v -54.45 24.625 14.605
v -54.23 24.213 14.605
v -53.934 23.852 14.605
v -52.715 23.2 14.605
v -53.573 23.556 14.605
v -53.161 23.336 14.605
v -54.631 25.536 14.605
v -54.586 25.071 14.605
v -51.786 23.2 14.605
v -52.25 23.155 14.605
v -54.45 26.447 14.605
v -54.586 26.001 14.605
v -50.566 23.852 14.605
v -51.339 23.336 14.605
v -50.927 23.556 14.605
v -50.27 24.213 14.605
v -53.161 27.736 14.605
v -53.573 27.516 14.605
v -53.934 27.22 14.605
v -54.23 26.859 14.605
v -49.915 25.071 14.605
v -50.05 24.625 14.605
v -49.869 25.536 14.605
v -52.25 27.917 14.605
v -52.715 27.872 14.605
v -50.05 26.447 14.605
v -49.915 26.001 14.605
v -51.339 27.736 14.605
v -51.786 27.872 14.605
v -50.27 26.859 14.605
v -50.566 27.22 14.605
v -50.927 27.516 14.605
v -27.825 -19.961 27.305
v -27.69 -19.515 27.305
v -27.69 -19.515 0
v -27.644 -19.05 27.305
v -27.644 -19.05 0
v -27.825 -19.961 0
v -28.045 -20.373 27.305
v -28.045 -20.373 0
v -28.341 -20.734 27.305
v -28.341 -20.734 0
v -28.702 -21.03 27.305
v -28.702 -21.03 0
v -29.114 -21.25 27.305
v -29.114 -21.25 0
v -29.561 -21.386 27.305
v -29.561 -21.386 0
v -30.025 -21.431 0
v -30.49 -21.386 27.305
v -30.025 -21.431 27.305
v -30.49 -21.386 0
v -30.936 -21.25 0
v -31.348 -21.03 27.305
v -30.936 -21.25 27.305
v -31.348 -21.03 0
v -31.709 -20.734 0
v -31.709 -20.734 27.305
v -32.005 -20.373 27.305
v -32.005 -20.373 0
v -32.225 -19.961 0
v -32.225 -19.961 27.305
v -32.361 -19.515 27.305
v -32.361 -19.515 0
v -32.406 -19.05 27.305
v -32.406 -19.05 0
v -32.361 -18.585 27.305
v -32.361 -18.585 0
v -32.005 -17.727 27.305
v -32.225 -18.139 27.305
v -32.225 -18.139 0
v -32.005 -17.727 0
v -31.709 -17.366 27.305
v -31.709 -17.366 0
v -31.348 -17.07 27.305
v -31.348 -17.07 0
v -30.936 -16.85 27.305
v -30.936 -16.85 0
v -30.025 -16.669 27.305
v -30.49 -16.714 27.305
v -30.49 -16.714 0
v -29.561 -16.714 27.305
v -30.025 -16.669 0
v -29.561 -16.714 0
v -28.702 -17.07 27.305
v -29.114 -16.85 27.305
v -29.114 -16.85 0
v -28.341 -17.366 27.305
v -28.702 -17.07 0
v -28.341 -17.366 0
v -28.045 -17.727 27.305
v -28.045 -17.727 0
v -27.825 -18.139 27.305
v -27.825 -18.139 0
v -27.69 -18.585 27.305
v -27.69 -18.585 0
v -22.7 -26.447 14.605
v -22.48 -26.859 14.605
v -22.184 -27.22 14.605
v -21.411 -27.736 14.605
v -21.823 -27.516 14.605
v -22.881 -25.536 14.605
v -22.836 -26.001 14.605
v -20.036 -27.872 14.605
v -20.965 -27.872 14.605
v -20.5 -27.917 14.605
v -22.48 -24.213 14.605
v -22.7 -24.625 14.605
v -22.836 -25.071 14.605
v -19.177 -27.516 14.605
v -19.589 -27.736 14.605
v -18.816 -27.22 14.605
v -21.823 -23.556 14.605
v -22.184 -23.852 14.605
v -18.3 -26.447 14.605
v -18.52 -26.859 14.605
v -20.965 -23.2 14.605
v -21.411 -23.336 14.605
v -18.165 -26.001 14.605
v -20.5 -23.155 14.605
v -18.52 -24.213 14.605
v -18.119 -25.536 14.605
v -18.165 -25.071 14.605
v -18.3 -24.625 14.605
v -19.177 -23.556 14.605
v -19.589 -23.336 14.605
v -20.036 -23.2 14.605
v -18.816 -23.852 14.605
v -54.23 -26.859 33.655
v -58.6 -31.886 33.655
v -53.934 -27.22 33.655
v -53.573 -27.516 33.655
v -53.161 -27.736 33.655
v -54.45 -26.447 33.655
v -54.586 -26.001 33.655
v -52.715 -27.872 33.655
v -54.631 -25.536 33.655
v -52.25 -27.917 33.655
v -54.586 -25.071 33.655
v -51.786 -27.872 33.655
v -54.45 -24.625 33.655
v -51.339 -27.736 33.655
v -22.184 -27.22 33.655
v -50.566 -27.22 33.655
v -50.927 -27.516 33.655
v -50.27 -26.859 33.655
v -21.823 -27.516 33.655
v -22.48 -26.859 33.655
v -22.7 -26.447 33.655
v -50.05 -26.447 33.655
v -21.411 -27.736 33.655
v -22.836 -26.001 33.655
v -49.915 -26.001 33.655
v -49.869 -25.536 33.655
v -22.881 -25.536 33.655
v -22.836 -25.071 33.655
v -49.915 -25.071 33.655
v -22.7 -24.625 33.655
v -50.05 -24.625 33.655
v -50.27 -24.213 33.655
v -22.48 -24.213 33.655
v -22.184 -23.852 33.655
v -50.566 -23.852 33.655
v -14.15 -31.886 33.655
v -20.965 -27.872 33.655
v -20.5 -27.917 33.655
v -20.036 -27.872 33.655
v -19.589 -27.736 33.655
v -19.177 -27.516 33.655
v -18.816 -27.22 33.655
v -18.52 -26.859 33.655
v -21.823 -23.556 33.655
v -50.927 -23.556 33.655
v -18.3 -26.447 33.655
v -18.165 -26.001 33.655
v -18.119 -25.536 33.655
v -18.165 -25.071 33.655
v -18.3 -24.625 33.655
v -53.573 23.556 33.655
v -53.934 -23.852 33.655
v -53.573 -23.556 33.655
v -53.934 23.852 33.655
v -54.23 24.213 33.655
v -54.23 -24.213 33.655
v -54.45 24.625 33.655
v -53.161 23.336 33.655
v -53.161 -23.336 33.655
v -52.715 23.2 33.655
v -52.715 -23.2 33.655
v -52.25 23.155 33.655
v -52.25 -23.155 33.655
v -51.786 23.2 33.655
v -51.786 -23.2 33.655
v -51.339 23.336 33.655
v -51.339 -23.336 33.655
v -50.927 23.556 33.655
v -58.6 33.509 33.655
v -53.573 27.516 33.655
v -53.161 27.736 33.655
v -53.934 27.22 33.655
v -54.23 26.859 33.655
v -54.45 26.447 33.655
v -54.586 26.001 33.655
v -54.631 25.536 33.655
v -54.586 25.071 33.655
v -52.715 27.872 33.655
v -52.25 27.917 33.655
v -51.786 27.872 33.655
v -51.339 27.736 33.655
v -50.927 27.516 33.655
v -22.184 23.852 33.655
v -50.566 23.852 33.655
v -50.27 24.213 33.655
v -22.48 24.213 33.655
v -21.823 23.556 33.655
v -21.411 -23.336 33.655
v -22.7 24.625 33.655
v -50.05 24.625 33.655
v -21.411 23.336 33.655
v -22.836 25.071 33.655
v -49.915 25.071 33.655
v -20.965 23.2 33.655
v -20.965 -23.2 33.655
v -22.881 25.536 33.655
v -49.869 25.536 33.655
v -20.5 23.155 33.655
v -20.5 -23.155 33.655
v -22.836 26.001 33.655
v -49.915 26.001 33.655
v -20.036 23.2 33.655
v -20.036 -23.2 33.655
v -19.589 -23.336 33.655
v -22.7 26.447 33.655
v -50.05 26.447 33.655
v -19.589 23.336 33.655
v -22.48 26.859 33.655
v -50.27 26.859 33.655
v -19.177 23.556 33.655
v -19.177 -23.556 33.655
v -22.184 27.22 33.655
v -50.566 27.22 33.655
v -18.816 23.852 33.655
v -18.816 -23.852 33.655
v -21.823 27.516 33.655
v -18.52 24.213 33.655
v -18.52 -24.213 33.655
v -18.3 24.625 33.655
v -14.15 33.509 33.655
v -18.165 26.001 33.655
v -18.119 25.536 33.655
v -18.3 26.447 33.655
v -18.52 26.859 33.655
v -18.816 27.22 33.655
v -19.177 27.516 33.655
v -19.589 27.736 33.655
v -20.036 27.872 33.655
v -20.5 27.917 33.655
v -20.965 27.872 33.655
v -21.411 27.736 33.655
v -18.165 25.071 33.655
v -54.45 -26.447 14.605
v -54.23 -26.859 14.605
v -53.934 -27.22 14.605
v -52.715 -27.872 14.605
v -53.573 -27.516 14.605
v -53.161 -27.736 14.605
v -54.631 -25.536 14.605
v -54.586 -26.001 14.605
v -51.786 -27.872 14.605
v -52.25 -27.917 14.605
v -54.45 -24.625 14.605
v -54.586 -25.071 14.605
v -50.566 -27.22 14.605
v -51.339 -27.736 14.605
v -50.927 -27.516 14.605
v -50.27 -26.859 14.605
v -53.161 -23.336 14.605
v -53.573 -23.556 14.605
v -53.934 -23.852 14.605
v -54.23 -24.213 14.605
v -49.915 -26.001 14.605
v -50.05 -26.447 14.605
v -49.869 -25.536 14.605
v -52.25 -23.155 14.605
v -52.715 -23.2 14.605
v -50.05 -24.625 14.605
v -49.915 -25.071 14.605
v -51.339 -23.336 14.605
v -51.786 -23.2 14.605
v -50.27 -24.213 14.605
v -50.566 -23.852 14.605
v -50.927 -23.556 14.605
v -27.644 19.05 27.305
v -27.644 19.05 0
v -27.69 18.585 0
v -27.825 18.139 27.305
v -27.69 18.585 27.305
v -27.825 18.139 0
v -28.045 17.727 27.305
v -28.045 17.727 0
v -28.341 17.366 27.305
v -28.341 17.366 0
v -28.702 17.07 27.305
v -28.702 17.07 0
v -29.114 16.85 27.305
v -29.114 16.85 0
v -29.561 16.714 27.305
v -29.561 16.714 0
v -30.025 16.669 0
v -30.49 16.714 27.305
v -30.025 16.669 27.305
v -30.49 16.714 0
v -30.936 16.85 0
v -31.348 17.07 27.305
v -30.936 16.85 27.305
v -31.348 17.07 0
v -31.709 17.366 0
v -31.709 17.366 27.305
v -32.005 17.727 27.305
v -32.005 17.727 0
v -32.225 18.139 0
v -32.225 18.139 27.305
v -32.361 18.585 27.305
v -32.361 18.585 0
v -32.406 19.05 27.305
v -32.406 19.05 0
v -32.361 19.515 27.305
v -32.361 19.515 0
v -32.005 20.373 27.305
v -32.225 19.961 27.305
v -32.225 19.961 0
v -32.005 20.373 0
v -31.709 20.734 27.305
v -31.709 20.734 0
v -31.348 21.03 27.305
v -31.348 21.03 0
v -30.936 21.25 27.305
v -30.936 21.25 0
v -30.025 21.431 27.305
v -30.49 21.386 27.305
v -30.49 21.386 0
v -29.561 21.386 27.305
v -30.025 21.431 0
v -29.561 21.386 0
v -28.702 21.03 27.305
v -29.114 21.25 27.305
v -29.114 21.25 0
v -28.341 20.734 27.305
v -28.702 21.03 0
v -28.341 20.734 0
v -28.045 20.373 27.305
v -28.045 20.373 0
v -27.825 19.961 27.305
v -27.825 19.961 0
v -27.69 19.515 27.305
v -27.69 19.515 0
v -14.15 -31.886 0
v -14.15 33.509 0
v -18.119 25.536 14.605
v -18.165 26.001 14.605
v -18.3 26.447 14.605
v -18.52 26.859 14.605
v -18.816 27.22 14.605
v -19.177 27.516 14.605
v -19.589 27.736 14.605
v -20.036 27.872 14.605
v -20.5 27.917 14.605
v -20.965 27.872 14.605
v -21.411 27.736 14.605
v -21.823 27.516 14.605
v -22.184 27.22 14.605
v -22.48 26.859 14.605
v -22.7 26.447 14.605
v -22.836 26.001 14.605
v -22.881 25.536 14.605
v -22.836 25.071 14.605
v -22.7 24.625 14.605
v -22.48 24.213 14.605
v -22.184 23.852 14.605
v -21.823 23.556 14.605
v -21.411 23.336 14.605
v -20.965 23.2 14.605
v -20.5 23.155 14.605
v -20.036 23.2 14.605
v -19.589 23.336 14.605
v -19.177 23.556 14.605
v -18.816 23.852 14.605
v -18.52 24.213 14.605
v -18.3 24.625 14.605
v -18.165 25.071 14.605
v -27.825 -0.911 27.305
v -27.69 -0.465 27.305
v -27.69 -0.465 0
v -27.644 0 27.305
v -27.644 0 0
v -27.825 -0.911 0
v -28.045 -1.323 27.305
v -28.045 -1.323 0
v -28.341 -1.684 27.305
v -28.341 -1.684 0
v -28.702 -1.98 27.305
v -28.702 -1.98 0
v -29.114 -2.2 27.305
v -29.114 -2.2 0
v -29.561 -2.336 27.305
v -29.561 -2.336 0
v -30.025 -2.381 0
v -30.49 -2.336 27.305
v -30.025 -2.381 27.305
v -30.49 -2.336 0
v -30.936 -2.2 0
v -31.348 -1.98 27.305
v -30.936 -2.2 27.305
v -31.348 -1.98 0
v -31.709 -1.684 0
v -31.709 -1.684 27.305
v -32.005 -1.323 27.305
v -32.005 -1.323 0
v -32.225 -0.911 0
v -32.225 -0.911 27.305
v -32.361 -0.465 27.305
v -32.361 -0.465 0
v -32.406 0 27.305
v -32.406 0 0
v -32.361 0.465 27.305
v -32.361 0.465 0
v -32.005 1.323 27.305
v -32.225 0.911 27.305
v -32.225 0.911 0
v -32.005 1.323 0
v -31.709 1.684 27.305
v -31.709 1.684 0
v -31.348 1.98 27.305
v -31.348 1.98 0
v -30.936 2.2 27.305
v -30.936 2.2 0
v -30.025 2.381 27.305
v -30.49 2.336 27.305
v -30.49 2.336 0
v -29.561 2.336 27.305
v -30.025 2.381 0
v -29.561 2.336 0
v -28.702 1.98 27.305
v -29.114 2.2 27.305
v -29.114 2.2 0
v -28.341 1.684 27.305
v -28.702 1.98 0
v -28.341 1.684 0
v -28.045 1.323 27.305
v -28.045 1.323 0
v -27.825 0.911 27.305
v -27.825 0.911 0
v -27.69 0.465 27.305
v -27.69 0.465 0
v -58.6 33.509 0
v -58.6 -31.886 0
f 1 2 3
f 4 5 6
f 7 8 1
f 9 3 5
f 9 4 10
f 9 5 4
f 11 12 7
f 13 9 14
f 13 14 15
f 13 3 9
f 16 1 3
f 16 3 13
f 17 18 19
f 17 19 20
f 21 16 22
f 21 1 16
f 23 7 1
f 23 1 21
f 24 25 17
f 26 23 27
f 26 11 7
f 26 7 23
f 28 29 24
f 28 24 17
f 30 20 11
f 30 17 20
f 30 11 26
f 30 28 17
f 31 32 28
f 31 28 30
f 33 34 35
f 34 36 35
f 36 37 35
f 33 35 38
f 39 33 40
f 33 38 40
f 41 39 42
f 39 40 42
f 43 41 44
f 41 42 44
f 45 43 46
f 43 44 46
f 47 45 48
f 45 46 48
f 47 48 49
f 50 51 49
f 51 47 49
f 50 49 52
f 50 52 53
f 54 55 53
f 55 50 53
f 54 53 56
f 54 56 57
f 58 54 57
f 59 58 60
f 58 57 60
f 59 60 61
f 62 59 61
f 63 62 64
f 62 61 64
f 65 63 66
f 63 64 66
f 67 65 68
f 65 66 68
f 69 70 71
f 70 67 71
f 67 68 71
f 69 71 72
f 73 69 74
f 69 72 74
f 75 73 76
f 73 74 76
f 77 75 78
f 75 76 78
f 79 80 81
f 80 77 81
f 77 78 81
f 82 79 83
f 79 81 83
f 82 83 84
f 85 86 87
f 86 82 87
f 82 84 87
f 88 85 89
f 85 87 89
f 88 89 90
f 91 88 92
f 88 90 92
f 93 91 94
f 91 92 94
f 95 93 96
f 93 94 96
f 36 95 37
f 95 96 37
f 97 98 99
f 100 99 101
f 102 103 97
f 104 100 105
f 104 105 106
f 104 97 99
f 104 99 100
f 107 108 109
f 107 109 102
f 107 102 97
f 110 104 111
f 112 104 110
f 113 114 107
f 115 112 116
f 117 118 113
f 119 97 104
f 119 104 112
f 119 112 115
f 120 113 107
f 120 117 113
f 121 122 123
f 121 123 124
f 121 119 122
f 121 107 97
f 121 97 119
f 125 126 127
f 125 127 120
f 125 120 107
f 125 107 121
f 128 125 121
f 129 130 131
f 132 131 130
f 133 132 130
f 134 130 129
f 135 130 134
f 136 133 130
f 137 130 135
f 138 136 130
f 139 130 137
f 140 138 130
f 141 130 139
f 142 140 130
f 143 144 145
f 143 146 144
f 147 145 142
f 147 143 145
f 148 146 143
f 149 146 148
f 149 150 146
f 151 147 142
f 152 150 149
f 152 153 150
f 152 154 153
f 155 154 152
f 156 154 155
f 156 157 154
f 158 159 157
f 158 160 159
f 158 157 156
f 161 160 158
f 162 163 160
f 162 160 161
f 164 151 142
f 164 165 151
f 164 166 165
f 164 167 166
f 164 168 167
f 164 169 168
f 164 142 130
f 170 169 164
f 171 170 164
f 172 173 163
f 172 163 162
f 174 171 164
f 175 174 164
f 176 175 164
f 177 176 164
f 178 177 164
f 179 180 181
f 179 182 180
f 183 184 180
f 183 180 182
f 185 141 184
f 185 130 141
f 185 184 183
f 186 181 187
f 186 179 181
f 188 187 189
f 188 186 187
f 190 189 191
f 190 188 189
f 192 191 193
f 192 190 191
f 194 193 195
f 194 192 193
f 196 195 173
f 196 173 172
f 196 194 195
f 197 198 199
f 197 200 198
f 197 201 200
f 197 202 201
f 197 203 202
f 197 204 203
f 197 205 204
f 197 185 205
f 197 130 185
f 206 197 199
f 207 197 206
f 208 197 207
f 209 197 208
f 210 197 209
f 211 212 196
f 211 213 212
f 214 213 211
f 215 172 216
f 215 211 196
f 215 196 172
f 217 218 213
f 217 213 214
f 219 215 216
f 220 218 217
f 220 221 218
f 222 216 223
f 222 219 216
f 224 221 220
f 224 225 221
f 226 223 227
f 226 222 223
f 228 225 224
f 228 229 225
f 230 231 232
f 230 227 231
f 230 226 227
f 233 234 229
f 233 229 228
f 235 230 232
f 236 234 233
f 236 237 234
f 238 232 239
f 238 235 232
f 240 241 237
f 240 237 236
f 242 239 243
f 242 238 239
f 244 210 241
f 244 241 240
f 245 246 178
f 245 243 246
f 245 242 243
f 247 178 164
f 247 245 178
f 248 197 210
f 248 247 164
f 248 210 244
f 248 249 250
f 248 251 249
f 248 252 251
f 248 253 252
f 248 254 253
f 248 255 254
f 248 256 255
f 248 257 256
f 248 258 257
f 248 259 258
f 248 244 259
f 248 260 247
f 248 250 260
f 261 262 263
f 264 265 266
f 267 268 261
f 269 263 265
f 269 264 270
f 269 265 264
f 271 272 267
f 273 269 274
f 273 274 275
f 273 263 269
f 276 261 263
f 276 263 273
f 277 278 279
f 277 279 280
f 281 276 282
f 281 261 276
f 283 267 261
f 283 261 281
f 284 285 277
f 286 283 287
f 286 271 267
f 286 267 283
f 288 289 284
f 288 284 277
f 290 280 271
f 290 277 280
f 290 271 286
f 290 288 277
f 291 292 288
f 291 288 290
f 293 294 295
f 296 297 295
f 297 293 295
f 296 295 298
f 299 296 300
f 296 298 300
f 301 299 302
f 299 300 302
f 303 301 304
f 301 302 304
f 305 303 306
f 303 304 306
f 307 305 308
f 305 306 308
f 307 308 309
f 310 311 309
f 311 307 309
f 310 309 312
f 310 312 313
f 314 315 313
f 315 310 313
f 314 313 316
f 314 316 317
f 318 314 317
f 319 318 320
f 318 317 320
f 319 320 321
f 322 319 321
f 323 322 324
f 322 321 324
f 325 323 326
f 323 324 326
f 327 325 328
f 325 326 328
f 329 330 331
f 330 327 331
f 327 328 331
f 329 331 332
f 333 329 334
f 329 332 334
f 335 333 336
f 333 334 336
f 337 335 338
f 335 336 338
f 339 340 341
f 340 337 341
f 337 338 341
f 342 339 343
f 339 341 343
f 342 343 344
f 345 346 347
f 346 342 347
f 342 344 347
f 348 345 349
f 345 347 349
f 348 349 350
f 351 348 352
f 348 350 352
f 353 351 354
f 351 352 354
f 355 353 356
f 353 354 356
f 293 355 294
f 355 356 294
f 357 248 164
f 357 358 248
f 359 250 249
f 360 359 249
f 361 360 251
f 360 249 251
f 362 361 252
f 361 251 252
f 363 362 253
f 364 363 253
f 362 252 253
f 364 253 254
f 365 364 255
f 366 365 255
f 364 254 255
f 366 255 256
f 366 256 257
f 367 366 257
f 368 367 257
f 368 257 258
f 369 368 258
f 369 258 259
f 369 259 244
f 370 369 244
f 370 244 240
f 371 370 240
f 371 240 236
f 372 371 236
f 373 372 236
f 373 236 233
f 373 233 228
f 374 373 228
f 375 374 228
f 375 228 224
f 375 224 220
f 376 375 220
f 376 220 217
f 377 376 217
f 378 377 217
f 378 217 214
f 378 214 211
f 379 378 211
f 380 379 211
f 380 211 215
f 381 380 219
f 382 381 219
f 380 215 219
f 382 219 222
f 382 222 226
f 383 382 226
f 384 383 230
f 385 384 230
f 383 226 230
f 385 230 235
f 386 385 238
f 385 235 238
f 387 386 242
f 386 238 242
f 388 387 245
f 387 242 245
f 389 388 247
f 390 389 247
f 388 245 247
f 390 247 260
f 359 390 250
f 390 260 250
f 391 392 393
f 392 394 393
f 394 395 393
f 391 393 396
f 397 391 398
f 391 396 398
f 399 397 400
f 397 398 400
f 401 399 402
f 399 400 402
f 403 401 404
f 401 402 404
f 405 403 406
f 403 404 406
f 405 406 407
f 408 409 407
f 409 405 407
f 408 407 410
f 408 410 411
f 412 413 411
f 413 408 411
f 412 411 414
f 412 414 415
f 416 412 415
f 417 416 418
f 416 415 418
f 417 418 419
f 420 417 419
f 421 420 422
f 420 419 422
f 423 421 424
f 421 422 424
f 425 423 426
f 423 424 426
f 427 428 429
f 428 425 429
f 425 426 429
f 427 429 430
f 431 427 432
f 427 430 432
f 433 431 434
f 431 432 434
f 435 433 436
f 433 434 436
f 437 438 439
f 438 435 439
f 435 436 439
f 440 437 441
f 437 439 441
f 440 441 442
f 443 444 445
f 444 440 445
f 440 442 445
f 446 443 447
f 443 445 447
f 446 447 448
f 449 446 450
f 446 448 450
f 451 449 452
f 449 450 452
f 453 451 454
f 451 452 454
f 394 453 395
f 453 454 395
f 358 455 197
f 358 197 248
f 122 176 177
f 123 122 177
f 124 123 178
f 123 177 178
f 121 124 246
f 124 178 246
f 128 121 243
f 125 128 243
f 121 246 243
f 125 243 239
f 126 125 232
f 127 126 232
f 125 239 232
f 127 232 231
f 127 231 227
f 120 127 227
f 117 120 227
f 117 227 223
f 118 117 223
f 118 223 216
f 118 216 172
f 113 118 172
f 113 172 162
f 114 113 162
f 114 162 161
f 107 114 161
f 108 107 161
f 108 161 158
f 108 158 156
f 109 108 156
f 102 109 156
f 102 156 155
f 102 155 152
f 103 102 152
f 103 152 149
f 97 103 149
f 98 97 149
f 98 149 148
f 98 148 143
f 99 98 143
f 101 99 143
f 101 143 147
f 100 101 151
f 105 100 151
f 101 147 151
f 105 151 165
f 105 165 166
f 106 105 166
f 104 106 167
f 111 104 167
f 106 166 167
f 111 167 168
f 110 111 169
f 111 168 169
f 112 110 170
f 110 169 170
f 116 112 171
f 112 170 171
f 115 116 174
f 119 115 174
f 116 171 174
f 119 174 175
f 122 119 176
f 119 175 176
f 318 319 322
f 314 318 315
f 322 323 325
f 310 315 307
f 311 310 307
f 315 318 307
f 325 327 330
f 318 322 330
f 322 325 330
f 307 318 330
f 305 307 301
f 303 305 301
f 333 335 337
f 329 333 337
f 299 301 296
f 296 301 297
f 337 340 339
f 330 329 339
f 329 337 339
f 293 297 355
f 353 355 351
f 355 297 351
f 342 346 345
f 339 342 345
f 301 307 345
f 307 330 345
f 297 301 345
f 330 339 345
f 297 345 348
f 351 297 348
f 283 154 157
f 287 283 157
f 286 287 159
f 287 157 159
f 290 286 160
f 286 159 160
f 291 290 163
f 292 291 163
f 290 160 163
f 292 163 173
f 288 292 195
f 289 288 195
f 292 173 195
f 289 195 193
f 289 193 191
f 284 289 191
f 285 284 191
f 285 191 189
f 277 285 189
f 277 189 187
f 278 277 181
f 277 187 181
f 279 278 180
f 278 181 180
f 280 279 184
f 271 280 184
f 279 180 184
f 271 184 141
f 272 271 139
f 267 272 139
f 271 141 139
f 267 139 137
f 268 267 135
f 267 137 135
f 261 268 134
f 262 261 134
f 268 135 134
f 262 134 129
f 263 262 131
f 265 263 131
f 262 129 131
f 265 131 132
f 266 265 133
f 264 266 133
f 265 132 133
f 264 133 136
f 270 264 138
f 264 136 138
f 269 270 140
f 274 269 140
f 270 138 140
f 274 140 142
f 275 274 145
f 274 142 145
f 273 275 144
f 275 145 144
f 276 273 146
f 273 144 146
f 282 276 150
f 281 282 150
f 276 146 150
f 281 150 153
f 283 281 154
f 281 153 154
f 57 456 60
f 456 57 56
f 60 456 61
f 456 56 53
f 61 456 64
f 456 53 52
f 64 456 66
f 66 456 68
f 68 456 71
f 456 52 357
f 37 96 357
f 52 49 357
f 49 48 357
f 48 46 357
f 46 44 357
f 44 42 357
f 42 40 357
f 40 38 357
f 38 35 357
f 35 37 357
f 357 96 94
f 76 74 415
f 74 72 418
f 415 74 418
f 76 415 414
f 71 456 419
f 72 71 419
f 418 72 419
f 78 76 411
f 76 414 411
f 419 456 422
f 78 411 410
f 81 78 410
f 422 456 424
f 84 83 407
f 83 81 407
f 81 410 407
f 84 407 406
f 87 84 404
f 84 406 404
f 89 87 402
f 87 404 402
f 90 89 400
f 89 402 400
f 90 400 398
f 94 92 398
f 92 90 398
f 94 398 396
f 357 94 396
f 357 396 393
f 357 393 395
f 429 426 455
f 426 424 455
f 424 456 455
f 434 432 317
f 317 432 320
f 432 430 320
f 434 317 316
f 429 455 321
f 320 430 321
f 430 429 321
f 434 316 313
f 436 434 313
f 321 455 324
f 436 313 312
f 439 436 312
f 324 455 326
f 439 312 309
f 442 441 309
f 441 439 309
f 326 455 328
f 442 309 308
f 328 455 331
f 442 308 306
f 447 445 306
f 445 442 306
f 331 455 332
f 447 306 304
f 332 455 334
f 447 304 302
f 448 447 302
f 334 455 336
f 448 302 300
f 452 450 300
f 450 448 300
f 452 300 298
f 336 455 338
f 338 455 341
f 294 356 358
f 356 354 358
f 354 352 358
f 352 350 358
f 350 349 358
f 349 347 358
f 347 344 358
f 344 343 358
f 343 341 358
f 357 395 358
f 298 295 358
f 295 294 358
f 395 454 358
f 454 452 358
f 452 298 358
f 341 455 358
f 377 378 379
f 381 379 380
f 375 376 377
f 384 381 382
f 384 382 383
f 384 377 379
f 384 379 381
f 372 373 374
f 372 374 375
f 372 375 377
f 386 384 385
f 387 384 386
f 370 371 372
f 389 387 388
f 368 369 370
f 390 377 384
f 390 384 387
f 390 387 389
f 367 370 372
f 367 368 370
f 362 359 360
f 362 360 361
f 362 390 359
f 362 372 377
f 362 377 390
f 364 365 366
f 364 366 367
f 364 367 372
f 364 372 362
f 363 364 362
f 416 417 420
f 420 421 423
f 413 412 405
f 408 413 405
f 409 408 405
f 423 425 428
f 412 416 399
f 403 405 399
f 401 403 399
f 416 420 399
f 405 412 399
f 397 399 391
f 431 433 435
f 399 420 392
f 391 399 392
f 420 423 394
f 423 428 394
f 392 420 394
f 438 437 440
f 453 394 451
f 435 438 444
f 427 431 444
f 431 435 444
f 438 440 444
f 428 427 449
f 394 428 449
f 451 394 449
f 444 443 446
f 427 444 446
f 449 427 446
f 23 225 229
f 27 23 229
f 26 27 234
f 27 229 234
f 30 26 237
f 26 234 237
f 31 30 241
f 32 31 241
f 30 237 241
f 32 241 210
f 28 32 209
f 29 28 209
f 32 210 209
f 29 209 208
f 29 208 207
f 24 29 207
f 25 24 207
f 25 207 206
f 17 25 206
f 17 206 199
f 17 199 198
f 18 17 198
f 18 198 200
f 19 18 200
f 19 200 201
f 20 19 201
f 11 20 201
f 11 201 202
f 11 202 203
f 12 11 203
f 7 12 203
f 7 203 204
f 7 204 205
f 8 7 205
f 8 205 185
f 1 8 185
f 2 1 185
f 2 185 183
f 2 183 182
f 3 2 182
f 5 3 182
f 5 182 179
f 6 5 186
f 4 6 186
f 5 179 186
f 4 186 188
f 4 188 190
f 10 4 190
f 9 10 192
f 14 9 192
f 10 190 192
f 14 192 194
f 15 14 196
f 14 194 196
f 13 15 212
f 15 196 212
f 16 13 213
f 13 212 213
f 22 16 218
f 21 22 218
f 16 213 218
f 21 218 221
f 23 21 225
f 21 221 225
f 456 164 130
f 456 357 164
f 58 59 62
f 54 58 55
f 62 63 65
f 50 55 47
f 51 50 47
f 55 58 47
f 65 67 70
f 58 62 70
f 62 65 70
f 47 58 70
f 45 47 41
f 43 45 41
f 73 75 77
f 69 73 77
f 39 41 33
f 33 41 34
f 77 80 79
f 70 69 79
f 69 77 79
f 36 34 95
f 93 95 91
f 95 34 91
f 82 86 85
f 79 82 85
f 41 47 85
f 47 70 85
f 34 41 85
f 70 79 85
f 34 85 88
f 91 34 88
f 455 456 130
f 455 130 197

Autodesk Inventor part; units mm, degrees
ref_plane "YZ Plane" through (0, 0, 0) normal (1, 0, 0) x (0, 1, 0)
ref_plane "XZ Plane" through (0, 0, 0) normal (0, 1, 0) x (-1, 0, 0)
ref_plane "XY Plane" through (0, 0, 0) normal (0, 0, 1) x (1, 0, 0)
sketch "Sketch1" plane through (0, 0, 0) normal (0, 0, 1) x (1, 0, 0)
  line L0 (-12.7, 528.7976) -> (-12.7, -380.5224)
  line L1 (12.7, 528.7976) -> (12.7, -380.5224)
  circle A0 centre (-30.0251, 19.05) radius 2.3813 projected
  circle A1 centre (-30.0251, 0) radius 2.3813 projected
  circle A2 centre (-30.0251, -19.05) radius 2.3813 projected
  line L2 (-14.1501, -31.886) -> (-58.6001, -31.886)
  line L3 (-58.6001, -31.886) -> (-58.6001, 33.5086)
  line L4 (-58.6001, 33.5086) -> (-14.1501, 33.5086)
  line L5 (-14.1501, 33.5086) -> (-14.1501, -31.886)
  line L6 (-25.1651, -297.4161) -> (-25.1651, -366.8339) projected
  point P0 (0, 0)
  dimension "d0" = 15.875
  dimension "d1" = 28.575
extrude "Extrusion1" add sketch "Sketch1" along normal blind 33.655
sketch "Sketch2" plane through (0, 0, 33.655) normal (0, 0, 1) x (1, 0, 0)
  circle A0 centre (-30.0251, -19.05) radius 2.3813 projected
  circle A1 centre (-30.0251, 0) radius 2.3813 projected
  circle A2 centre (-30.0251, 19.05) radius 2.3813 projected
  point P0 (0, 0)
extrude "Extrusion2" add sketch "Sketch2" against normal blind 6.35
sketch "Sketch3" plane through (0, 0, 33.655) normal (0, 0, 1) x (1, 0, 0)
  circle A0 centre (-52.2501, -25.536) radius 2.3813
  line L0 (-58.6001, 33.5086) -> (-58.6001, -31.886) construction
  line L1 (-58.6001, 0) -> (-1.0342, 0) construction
  line L2 (-58.6001, -31.886) -> (-14.1501, -31.886) construction
  line L3 (-36.3751, -31.886) -> (-36.3751, 36.9987) construction
  circle A1 centre (-30.0251, -19.05) radius 2.3813 construction
  circle A2 centre (-30.0251, 0) radius 2.3813 construction
  circle A3 centre (-30.0251, 19.05) radius 2.3813 construction
  circle A4 centre (-52.2501, 25.536) radius 2.3813
  circle A5 centre (-20.5001, -25.536) radius 2.3813
  circle A6 centre (-20.5001, 25.536) radius 2.3813
  point P0 (0, 0)
  dimension "d6" = 4.7625
  dimension "d7" = 6.35
  dimension "d8" = 6.35
extrude "Extrusion3" cut sketch "Sketch3" against normal blind 19.05
sketch "Sketch4" plane through (0, 0, 33.655) normal (0, 0, 1) x (1, 0, 0)
  point P0 (0, 0)
properties part number "Transmission Clamp"
